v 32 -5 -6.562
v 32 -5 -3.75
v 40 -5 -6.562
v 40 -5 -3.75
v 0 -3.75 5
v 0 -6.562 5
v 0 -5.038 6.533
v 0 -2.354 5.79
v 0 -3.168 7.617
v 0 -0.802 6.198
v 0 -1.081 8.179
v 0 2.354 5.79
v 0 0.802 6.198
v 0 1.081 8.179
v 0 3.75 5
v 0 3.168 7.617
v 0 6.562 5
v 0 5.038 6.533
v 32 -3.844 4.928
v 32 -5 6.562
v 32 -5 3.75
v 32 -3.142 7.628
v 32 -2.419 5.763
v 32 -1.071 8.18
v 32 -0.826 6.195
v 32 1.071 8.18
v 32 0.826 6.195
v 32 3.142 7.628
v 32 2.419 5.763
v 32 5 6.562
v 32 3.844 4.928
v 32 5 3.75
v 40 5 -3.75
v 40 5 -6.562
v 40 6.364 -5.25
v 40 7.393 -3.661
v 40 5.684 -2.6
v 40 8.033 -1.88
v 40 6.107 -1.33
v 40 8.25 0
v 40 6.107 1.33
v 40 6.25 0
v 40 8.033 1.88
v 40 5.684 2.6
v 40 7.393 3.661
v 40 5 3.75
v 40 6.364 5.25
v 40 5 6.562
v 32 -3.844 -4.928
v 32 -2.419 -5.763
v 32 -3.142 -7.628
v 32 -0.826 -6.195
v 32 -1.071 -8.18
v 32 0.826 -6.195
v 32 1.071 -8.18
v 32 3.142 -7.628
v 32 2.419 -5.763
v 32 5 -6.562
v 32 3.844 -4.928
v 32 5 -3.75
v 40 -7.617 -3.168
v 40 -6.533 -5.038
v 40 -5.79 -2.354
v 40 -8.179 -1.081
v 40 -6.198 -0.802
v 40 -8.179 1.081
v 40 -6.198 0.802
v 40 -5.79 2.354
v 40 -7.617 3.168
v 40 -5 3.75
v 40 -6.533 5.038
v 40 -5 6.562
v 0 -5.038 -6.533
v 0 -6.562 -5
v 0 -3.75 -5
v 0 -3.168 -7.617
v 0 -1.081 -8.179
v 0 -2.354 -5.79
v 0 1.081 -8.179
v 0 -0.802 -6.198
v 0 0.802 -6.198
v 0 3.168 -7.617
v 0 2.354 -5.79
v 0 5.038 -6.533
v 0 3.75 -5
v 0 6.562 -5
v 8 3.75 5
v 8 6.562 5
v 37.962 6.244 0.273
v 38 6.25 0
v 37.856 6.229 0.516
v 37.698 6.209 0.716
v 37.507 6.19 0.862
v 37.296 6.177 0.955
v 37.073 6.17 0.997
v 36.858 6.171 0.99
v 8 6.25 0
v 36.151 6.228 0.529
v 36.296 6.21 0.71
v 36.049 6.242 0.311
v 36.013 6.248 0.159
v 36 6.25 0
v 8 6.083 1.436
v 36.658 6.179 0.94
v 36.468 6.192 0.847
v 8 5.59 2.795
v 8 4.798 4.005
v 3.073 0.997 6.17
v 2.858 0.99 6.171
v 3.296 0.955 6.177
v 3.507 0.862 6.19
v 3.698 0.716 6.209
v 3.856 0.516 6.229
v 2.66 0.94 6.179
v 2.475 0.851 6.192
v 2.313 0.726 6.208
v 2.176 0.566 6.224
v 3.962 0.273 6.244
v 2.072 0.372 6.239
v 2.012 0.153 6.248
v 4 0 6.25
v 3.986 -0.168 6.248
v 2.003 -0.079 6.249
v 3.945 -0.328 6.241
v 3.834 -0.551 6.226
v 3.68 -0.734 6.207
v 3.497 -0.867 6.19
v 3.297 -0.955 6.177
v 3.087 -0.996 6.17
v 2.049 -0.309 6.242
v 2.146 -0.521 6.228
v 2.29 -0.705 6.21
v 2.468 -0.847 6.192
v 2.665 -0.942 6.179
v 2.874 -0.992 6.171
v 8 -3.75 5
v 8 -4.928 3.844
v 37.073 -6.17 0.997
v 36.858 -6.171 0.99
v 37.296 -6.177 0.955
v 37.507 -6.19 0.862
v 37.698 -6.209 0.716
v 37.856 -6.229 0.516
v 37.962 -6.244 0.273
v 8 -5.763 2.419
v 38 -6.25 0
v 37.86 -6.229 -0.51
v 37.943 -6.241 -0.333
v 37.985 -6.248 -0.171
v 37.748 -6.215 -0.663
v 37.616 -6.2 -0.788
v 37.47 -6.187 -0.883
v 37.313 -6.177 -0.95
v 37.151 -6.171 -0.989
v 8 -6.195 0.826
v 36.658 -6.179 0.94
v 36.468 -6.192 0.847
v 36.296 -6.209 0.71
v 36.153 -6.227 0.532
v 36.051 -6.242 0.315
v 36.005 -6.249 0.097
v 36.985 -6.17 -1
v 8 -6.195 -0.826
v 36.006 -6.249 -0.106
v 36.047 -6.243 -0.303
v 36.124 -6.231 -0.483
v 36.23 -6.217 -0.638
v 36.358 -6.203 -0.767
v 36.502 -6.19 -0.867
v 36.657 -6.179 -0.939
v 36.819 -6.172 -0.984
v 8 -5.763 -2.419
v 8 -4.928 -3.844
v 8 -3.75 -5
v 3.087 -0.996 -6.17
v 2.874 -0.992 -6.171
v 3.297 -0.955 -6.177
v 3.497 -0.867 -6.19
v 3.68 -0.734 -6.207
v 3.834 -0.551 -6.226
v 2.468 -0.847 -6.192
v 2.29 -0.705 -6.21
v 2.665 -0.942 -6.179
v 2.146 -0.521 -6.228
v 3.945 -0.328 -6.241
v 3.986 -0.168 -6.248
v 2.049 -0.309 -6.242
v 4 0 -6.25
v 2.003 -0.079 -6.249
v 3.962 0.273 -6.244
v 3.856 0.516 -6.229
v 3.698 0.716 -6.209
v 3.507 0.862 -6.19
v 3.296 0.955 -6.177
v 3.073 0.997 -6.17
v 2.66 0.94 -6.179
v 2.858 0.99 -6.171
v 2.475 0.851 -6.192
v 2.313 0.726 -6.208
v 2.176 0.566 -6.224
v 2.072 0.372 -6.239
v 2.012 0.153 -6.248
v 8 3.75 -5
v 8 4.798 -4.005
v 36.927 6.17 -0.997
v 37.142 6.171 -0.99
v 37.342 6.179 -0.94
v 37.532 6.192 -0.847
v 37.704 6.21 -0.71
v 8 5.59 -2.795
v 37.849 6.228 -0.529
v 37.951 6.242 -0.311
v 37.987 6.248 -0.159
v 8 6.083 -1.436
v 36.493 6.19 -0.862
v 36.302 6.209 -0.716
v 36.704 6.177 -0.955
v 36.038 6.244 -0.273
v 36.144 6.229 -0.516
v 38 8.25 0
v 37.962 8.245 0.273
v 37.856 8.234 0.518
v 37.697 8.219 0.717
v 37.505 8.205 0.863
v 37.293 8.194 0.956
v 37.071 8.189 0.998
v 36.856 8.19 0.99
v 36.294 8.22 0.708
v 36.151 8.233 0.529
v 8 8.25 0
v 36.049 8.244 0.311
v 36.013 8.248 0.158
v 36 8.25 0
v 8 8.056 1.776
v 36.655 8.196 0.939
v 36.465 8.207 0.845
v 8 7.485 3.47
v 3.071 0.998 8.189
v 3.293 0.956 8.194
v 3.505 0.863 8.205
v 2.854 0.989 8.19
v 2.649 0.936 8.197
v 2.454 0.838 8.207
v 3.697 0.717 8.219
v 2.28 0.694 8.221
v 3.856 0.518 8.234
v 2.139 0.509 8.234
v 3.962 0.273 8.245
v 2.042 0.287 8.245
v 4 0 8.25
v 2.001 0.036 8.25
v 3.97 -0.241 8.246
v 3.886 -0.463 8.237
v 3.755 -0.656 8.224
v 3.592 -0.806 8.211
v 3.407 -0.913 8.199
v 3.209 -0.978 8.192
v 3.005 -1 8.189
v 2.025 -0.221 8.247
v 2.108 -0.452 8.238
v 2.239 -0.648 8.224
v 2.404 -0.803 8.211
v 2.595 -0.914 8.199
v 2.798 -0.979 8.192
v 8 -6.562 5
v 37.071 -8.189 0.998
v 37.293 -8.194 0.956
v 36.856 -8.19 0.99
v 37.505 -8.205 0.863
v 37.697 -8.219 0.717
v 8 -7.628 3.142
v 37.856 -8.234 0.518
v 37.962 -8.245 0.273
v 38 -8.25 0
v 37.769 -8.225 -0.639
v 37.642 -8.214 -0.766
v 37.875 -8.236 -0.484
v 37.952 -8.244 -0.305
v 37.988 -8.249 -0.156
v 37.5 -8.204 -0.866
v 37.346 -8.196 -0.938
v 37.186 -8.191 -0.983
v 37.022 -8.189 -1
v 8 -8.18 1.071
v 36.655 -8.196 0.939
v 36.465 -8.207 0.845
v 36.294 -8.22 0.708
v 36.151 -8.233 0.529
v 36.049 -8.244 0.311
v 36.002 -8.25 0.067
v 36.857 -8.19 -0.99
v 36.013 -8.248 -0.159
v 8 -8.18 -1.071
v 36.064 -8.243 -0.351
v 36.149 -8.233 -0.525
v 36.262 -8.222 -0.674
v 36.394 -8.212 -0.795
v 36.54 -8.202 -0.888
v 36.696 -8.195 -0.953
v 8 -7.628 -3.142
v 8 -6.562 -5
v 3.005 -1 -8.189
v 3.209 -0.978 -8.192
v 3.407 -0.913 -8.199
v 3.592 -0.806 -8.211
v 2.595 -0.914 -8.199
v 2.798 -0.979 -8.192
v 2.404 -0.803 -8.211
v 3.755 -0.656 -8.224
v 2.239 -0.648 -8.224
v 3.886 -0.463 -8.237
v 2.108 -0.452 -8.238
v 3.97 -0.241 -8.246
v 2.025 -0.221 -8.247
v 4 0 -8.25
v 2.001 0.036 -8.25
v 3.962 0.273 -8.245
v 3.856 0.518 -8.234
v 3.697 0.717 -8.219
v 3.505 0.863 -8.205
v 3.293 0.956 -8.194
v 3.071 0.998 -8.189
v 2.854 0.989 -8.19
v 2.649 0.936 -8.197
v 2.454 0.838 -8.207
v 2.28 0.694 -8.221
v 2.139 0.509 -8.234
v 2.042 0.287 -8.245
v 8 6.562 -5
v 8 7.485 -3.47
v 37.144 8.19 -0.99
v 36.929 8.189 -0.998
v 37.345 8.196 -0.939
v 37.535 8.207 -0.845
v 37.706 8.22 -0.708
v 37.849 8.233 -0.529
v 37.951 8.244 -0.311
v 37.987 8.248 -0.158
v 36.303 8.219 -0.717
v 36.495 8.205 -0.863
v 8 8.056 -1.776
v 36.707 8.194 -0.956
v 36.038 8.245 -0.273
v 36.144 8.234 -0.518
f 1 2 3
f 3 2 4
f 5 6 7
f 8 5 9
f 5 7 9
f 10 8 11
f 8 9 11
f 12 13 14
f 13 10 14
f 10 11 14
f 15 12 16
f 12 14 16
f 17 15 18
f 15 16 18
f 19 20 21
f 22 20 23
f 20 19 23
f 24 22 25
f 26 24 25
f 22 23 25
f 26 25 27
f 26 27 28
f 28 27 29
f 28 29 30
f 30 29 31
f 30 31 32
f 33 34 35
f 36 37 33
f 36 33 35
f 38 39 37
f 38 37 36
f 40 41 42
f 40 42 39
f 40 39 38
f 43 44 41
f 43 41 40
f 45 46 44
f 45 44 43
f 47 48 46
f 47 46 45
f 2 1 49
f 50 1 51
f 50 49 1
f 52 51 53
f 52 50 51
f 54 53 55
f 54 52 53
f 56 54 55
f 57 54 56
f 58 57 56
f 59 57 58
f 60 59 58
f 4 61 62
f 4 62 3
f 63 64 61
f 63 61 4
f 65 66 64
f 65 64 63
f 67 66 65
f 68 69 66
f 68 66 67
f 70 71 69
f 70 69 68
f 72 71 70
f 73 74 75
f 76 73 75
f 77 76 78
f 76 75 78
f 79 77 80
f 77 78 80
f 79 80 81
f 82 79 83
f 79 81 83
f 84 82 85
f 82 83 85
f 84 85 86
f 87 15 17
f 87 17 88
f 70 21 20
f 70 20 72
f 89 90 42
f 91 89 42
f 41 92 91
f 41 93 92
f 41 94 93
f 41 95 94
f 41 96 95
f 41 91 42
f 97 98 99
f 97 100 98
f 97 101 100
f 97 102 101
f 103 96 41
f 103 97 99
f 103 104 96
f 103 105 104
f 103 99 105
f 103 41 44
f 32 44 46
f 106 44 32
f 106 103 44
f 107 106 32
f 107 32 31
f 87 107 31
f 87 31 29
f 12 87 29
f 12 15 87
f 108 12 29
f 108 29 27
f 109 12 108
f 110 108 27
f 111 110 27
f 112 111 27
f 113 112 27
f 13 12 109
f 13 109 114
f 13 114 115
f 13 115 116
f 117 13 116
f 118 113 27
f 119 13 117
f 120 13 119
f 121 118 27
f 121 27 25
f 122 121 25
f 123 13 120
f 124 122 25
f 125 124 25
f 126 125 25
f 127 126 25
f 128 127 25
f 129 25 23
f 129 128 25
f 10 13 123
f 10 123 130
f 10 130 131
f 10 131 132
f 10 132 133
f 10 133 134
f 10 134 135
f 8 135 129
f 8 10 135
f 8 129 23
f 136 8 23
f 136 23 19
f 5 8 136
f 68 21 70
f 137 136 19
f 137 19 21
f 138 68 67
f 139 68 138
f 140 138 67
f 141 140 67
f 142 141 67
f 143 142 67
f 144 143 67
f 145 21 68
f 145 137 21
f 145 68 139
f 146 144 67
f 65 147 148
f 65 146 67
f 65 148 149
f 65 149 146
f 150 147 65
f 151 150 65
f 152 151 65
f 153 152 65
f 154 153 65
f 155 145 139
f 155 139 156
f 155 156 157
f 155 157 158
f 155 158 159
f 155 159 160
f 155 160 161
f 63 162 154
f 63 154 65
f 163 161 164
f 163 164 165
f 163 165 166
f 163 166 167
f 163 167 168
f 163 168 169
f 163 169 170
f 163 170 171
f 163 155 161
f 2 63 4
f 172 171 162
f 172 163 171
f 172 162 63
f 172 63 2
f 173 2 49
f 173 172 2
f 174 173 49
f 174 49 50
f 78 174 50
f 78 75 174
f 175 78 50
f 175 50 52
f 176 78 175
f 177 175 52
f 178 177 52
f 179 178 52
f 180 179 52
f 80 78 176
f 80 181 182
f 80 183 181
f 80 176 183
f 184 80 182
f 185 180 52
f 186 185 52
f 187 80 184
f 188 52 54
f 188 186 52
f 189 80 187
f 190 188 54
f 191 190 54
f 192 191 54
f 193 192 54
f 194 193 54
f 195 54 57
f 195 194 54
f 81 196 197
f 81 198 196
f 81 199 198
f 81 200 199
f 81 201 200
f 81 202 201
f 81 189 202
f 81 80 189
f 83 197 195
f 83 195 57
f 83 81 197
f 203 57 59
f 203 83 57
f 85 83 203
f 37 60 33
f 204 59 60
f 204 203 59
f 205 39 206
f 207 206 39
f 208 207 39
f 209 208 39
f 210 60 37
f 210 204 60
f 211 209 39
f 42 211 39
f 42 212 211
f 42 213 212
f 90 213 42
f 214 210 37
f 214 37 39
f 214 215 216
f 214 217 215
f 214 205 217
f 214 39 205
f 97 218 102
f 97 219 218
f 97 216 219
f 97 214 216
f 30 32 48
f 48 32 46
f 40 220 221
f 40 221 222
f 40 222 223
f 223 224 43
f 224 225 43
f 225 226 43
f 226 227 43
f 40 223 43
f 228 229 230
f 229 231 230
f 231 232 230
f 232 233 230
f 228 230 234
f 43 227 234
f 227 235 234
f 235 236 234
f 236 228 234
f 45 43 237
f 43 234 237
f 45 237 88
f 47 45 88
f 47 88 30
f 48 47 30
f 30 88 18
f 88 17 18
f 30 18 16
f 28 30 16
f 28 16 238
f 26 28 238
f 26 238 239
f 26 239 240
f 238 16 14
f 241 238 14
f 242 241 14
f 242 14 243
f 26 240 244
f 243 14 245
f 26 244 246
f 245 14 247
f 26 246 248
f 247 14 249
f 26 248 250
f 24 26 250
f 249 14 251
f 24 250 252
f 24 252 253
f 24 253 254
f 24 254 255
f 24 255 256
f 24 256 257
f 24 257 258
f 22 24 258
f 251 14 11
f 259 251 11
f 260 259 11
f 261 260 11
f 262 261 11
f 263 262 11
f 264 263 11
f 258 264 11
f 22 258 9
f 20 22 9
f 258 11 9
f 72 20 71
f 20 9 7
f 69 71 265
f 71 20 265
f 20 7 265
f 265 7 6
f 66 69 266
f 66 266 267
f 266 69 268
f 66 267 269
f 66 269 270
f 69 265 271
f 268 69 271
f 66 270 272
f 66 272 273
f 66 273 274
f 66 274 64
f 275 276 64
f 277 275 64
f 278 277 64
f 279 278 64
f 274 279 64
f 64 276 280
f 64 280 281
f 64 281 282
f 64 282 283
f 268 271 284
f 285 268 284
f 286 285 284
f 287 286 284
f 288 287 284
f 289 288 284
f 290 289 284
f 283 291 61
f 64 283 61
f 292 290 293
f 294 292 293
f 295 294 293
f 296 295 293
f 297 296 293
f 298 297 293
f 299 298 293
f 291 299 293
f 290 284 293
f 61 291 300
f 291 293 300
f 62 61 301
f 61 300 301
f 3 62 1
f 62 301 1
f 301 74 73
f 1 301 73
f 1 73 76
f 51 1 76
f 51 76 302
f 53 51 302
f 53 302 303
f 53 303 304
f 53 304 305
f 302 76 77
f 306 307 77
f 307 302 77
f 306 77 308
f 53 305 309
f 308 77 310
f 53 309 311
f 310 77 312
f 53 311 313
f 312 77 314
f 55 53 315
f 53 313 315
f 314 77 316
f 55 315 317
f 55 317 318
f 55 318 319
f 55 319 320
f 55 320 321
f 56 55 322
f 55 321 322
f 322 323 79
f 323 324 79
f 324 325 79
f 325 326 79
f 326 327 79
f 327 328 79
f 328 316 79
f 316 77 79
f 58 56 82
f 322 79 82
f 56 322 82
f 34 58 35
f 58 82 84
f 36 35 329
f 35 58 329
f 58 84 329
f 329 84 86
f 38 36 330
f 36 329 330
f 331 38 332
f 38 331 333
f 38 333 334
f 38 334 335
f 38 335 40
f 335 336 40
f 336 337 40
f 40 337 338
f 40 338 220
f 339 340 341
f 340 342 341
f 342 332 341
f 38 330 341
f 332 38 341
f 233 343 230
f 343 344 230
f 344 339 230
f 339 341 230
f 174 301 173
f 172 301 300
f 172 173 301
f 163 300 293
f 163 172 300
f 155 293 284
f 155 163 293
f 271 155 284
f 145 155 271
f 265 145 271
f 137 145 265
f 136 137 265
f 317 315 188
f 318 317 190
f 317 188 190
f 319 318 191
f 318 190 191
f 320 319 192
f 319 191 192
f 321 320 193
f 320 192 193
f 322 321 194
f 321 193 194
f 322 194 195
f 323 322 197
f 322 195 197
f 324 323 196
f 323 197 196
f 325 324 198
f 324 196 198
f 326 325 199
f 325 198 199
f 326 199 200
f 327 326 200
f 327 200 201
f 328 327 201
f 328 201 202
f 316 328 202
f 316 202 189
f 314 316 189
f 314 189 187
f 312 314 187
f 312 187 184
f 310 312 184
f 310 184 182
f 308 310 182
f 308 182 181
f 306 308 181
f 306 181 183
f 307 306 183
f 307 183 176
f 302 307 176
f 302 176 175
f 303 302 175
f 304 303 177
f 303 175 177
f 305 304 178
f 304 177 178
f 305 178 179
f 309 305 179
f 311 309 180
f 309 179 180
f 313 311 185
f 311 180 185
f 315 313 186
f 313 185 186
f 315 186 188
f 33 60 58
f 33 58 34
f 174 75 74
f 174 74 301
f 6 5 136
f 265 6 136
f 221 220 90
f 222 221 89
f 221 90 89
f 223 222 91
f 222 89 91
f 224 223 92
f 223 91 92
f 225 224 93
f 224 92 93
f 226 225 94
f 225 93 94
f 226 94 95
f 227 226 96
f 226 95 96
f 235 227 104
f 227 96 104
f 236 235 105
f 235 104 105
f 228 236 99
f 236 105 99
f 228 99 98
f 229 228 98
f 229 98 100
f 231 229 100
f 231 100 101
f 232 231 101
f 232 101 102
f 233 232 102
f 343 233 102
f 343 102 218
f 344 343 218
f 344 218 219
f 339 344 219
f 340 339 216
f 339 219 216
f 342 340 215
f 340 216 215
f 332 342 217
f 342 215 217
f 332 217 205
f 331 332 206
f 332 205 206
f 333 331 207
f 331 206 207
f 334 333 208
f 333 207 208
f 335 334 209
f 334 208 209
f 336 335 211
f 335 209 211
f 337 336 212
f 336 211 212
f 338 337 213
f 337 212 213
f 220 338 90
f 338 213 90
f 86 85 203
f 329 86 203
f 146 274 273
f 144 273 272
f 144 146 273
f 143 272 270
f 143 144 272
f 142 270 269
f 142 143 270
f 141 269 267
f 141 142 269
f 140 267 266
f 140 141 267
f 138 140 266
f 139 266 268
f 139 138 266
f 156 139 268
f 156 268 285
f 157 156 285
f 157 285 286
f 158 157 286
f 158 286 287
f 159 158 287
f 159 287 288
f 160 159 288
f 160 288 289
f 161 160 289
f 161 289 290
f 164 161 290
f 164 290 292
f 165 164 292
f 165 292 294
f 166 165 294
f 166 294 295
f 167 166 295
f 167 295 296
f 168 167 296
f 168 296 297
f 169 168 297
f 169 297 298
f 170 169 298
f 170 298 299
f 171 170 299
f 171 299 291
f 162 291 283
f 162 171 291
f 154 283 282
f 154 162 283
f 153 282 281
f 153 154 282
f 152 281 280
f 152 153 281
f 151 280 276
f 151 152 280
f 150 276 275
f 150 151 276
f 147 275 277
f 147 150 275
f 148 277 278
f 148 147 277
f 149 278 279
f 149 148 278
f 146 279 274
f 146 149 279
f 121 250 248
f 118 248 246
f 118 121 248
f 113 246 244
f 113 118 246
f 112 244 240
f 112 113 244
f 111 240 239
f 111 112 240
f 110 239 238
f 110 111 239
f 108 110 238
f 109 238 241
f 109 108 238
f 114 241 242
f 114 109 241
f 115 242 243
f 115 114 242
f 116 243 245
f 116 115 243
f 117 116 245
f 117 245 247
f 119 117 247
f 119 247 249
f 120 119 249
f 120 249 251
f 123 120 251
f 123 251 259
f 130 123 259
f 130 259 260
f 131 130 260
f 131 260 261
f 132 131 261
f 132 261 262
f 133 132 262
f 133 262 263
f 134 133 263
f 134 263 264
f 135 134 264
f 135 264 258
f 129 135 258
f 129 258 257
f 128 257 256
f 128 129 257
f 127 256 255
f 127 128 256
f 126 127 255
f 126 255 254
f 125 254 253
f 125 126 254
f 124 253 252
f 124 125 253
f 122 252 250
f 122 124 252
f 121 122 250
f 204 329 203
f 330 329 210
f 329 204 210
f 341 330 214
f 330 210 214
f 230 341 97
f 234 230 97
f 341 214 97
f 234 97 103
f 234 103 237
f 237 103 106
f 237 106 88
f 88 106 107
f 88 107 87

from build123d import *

# Parameters (mm, degrees)
F0_R          = 8.25
F0_R_2        = 6.25
F1_DEPTH      = 40
F2_W          = 20.5353749644
F2_H          = 10
F2_R          = 1
F3_DEPTH      = 25
F3_DEPTH_BACK = 25
F4_R          = 1
F4_W          = 9.5603424124
F4_H          = 10
F5_DEPTH      = 25
F5_DEPTH_BACK = 25


with BuildPart() as f1:
    # F0 (on Right) → F1 (new body)
    with BuildSketch(Plane.YZ):
        Circle(F0_R)
        Circle(F0_R_2, mode=Mode.SUBTRACT)
    extrude(amount=F1_DEPTH)

    # F2 (on Top) → F3 (cut, two sides)
    with BuildSketch(Plane.XY) as f3_sk:
        with Locations((42.2676874822, 0)):
            Rectangle(F2_W, F2_H)
        with Locations((3, 0)):
            Circle(F2_R)
    extrude(amount=-F3_DEPTH, mode=Mode.SUBTRACT)
    extrude(f3_sk.sketch, amount=F3_DEPTH_BACK, mode=Mode.SUBTRACT)

    # F4 (on Front) → F5 (cut, two sides)
    with BuildSketch(Plane.XZ) as f5_sk:
        with Locations((37, 0)):
            Circle(F4_R)
        with Locations((3.2198287938, 0)):
            Rectangle(F4_W, F4_H)
    extrude(amount=-F5_DEPTH, mode=Mode.SUBTRACT)
    extrude(f5_sk.sketch, amount=F5_DEPTH_BACK, mode=Mode.SUBTRACT)


solid = f1.part
